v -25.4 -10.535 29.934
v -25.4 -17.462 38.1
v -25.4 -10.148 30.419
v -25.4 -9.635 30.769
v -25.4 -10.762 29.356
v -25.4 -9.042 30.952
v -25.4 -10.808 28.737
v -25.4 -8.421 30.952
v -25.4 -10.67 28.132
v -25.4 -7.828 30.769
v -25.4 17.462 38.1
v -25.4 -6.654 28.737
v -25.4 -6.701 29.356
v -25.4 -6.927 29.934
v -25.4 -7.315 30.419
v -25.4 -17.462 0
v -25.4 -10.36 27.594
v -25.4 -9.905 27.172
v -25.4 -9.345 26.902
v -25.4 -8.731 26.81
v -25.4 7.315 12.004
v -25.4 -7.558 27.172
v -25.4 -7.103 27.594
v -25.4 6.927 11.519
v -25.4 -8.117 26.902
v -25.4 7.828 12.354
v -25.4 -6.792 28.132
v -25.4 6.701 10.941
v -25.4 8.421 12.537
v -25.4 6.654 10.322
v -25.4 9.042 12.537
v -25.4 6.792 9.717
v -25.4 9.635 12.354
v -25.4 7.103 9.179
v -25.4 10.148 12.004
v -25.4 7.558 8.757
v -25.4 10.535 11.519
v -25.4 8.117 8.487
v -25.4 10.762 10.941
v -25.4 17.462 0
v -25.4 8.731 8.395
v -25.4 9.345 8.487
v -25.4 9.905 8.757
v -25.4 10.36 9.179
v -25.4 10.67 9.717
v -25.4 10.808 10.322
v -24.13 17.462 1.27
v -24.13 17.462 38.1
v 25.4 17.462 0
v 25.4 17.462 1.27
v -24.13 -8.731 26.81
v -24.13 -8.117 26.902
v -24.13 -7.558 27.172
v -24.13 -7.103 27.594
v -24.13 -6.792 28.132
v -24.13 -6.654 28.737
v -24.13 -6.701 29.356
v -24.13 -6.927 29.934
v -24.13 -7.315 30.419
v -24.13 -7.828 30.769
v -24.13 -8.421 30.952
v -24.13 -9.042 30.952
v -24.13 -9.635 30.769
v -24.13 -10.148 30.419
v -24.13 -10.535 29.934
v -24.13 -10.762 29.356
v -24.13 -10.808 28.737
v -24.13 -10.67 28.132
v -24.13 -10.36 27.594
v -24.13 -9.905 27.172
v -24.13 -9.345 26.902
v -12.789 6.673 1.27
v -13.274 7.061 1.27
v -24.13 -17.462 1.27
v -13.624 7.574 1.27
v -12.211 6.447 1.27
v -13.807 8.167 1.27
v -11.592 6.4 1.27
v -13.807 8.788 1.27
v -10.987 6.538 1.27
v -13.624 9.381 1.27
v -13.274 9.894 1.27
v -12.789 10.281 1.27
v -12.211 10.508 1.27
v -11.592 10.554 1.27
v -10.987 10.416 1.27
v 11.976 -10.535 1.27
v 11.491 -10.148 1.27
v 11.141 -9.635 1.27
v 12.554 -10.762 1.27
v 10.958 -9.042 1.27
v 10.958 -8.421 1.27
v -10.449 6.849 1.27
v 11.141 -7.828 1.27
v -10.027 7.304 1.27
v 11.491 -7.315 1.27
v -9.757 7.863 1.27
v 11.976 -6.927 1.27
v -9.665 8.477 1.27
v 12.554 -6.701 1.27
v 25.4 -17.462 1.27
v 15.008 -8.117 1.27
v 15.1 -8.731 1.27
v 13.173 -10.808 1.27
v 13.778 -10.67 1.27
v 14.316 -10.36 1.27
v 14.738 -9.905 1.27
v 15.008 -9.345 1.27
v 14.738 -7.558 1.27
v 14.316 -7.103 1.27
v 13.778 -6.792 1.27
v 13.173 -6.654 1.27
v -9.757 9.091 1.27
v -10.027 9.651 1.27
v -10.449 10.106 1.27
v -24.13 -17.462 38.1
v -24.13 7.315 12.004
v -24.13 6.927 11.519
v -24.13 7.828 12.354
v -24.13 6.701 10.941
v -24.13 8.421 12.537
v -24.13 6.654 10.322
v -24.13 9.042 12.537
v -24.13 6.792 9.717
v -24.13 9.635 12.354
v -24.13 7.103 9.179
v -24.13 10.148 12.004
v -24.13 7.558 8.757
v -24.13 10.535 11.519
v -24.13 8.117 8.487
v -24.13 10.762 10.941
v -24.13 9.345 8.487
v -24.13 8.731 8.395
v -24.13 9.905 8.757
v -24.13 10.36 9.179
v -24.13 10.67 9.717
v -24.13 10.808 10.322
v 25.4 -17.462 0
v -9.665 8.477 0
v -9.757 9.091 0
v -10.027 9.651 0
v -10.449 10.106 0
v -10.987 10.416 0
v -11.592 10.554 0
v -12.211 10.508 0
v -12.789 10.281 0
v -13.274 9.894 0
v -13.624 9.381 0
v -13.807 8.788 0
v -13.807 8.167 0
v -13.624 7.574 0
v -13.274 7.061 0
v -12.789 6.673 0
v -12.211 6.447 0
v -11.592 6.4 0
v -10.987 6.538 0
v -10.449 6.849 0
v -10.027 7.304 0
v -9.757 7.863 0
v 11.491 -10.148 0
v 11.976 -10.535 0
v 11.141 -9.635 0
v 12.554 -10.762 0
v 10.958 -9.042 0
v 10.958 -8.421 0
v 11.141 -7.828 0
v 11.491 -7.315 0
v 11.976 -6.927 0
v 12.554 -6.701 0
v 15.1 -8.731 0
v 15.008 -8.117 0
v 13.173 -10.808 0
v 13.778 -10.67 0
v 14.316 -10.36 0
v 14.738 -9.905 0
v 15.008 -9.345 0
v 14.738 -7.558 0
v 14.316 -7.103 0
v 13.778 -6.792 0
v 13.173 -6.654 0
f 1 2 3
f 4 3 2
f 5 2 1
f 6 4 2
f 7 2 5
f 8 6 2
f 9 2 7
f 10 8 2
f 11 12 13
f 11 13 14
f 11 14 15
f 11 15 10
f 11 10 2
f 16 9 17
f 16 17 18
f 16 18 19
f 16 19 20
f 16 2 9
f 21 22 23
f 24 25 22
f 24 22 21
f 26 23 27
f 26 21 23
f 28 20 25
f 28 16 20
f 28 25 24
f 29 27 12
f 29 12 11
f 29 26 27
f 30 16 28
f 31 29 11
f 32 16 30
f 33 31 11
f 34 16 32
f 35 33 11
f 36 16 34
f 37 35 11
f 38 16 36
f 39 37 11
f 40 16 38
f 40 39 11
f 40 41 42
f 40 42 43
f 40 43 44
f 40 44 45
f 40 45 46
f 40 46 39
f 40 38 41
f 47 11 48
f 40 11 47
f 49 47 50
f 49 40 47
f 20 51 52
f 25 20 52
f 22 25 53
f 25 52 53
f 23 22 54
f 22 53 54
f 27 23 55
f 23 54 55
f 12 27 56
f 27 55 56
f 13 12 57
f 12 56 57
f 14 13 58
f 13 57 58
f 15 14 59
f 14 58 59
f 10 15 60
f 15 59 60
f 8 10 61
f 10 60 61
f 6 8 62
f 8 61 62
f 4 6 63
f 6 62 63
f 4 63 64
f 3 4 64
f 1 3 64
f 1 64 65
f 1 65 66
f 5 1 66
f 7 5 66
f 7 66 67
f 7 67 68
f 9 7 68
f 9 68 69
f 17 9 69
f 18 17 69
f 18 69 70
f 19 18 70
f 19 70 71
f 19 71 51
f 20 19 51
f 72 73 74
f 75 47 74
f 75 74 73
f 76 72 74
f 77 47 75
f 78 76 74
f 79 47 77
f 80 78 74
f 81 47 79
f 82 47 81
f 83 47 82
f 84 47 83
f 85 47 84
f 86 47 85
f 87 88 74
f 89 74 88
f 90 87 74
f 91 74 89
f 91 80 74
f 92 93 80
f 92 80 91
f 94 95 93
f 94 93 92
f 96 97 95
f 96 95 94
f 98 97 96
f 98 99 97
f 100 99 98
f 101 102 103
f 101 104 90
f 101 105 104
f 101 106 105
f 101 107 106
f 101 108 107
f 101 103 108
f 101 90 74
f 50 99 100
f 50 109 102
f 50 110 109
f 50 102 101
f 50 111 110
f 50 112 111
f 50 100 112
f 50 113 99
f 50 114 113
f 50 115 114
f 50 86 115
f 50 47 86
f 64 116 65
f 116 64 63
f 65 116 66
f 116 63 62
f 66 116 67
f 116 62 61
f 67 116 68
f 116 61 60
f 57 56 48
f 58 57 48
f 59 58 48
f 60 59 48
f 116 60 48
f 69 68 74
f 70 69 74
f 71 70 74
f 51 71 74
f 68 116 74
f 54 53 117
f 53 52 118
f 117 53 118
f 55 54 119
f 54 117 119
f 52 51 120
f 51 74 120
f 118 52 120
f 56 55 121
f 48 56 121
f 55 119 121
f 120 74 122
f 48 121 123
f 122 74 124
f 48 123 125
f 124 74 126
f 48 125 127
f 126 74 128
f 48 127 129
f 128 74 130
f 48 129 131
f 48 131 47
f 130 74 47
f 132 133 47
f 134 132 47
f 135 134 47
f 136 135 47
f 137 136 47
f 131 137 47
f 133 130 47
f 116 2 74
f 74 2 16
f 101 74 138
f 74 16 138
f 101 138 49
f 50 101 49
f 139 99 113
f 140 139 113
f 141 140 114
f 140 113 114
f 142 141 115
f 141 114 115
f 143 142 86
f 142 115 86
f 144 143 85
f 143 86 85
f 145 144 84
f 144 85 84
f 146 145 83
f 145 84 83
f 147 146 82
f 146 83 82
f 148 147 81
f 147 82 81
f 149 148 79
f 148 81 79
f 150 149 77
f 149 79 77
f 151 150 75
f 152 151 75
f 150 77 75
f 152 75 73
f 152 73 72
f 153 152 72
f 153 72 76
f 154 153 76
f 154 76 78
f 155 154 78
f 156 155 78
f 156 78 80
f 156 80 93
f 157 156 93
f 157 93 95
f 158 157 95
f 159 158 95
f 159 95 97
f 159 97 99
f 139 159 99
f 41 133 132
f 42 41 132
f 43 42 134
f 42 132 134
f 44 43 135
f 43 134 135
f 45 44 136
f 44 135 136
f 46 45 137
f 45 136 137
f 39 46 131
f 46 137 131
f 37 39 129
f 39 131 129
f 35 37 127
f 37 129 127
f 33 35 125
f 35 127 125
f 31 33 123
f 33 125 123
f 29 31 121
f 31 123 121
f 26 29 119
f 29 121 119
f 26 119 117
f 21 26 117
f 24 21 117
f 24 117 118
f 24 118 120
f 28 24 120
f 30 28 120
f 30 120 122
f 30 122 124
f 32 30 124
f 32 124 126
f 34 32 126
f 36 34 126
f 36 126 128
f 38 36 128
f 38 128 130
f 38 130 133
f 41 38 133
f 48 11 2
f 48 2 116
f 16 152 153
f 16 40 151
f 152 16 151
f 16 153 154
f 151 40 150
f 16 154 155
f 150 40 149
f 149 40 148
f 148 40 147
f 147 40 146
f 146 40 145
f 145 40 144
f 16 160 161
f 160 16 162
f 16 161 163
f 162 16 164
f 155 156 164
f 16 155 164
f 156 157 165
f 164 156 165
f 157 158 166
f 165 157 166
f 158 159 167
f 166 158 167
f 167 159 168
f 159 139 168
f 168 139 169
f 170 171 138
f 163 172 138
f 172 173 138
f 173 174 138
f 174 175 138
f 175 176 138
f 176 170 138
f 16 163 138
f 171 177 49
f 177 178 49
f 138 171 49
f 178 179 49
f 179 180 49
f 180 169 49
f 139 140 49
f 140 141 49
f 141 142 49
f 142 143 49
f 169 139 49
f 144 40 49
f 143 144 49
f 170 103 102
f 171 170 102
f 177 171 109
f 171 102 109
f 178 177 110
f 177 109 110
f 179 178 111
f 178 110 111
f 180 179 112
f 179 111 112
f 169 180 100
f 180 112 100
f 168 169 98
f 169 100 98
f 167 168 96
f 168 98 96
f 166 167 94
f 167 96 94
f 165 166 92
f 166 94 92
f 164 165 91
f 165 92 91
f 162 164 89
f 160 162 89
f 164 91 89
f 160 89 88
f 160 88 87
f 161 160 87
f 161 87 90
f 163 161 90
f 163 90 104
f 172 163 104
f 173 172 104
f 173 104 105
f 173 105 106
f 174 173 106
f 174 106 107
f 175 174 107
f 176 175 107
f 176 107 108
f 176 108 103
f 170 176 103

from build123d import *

# Parameters (mm, degrees)
SKETCH1_W           = 50.8
SKETCH1_H           = 34.925
BOSS_EXTRUDE1_DEPTH = 1.27
SKETCH2_W           = 1.27
SKETCH2_H           = 34.925
BOSS_EXTRUDE2_DEPTH = 36.83
SKETCH3_R           = 2.0828
CUT_EXTRUDE1_DEPTH  = 36.83
SKETCH4_R           = 2.0828
CUT_EXTRUDE2_DEPTH  = 36.83


with BuildPart() as part:
    # Sketch1 → Boss-Extrude1 (new body)
    with BuildSketch(Plane.XY):
        Rectangle(SKETCH1_W, SKETCH1_H)
    extrude(amount=BOSS_EXTRUDE1_DEPTH)

    # Sketch2 → Boss-Extrude2 (add)
    with BuildSketch(Plane.XY.offset(1.27)):
        with Locations((-24.765, 0)):
            Rectangle(SKETCH2_W, SKETCH2_H)
    extrude(amount=BOSS_EXTRUDE2_DEPTH)

    # Sketch3 → Cut-Extrude1 (cut)
    with BuildSketch(Plane(origin=(-24.13, 0, 0), x_dir=(0, 0, -1), z_dir=(1, 0, 0))):
        with Locations((-10.4775, 8.73125)):
            Circle(SKETCH3_R)
        with Locations((-28.8925, -8.73125)):
            Circle(SKETCH3_R)
    extrude(amount=-CUT_EXTRUDE1_DEPTH, mode=Mode.SUBTRACT)

    # Sketch4 → Cut-Extrude2 (cut)
    with BuildSketch(Plane.XY.offset(1.27)):
        with Locations((-11.7475, 8.47725)):
            Circle(SKETCH4_R)
        with Locations((13.0175, -8.73125)):
            Circle(SKETCH4_R)
    extrude(amount=-CUT_EXTRUDE2_DEPTH, mode=Mode.SUBTRACT)


solid = part.part
